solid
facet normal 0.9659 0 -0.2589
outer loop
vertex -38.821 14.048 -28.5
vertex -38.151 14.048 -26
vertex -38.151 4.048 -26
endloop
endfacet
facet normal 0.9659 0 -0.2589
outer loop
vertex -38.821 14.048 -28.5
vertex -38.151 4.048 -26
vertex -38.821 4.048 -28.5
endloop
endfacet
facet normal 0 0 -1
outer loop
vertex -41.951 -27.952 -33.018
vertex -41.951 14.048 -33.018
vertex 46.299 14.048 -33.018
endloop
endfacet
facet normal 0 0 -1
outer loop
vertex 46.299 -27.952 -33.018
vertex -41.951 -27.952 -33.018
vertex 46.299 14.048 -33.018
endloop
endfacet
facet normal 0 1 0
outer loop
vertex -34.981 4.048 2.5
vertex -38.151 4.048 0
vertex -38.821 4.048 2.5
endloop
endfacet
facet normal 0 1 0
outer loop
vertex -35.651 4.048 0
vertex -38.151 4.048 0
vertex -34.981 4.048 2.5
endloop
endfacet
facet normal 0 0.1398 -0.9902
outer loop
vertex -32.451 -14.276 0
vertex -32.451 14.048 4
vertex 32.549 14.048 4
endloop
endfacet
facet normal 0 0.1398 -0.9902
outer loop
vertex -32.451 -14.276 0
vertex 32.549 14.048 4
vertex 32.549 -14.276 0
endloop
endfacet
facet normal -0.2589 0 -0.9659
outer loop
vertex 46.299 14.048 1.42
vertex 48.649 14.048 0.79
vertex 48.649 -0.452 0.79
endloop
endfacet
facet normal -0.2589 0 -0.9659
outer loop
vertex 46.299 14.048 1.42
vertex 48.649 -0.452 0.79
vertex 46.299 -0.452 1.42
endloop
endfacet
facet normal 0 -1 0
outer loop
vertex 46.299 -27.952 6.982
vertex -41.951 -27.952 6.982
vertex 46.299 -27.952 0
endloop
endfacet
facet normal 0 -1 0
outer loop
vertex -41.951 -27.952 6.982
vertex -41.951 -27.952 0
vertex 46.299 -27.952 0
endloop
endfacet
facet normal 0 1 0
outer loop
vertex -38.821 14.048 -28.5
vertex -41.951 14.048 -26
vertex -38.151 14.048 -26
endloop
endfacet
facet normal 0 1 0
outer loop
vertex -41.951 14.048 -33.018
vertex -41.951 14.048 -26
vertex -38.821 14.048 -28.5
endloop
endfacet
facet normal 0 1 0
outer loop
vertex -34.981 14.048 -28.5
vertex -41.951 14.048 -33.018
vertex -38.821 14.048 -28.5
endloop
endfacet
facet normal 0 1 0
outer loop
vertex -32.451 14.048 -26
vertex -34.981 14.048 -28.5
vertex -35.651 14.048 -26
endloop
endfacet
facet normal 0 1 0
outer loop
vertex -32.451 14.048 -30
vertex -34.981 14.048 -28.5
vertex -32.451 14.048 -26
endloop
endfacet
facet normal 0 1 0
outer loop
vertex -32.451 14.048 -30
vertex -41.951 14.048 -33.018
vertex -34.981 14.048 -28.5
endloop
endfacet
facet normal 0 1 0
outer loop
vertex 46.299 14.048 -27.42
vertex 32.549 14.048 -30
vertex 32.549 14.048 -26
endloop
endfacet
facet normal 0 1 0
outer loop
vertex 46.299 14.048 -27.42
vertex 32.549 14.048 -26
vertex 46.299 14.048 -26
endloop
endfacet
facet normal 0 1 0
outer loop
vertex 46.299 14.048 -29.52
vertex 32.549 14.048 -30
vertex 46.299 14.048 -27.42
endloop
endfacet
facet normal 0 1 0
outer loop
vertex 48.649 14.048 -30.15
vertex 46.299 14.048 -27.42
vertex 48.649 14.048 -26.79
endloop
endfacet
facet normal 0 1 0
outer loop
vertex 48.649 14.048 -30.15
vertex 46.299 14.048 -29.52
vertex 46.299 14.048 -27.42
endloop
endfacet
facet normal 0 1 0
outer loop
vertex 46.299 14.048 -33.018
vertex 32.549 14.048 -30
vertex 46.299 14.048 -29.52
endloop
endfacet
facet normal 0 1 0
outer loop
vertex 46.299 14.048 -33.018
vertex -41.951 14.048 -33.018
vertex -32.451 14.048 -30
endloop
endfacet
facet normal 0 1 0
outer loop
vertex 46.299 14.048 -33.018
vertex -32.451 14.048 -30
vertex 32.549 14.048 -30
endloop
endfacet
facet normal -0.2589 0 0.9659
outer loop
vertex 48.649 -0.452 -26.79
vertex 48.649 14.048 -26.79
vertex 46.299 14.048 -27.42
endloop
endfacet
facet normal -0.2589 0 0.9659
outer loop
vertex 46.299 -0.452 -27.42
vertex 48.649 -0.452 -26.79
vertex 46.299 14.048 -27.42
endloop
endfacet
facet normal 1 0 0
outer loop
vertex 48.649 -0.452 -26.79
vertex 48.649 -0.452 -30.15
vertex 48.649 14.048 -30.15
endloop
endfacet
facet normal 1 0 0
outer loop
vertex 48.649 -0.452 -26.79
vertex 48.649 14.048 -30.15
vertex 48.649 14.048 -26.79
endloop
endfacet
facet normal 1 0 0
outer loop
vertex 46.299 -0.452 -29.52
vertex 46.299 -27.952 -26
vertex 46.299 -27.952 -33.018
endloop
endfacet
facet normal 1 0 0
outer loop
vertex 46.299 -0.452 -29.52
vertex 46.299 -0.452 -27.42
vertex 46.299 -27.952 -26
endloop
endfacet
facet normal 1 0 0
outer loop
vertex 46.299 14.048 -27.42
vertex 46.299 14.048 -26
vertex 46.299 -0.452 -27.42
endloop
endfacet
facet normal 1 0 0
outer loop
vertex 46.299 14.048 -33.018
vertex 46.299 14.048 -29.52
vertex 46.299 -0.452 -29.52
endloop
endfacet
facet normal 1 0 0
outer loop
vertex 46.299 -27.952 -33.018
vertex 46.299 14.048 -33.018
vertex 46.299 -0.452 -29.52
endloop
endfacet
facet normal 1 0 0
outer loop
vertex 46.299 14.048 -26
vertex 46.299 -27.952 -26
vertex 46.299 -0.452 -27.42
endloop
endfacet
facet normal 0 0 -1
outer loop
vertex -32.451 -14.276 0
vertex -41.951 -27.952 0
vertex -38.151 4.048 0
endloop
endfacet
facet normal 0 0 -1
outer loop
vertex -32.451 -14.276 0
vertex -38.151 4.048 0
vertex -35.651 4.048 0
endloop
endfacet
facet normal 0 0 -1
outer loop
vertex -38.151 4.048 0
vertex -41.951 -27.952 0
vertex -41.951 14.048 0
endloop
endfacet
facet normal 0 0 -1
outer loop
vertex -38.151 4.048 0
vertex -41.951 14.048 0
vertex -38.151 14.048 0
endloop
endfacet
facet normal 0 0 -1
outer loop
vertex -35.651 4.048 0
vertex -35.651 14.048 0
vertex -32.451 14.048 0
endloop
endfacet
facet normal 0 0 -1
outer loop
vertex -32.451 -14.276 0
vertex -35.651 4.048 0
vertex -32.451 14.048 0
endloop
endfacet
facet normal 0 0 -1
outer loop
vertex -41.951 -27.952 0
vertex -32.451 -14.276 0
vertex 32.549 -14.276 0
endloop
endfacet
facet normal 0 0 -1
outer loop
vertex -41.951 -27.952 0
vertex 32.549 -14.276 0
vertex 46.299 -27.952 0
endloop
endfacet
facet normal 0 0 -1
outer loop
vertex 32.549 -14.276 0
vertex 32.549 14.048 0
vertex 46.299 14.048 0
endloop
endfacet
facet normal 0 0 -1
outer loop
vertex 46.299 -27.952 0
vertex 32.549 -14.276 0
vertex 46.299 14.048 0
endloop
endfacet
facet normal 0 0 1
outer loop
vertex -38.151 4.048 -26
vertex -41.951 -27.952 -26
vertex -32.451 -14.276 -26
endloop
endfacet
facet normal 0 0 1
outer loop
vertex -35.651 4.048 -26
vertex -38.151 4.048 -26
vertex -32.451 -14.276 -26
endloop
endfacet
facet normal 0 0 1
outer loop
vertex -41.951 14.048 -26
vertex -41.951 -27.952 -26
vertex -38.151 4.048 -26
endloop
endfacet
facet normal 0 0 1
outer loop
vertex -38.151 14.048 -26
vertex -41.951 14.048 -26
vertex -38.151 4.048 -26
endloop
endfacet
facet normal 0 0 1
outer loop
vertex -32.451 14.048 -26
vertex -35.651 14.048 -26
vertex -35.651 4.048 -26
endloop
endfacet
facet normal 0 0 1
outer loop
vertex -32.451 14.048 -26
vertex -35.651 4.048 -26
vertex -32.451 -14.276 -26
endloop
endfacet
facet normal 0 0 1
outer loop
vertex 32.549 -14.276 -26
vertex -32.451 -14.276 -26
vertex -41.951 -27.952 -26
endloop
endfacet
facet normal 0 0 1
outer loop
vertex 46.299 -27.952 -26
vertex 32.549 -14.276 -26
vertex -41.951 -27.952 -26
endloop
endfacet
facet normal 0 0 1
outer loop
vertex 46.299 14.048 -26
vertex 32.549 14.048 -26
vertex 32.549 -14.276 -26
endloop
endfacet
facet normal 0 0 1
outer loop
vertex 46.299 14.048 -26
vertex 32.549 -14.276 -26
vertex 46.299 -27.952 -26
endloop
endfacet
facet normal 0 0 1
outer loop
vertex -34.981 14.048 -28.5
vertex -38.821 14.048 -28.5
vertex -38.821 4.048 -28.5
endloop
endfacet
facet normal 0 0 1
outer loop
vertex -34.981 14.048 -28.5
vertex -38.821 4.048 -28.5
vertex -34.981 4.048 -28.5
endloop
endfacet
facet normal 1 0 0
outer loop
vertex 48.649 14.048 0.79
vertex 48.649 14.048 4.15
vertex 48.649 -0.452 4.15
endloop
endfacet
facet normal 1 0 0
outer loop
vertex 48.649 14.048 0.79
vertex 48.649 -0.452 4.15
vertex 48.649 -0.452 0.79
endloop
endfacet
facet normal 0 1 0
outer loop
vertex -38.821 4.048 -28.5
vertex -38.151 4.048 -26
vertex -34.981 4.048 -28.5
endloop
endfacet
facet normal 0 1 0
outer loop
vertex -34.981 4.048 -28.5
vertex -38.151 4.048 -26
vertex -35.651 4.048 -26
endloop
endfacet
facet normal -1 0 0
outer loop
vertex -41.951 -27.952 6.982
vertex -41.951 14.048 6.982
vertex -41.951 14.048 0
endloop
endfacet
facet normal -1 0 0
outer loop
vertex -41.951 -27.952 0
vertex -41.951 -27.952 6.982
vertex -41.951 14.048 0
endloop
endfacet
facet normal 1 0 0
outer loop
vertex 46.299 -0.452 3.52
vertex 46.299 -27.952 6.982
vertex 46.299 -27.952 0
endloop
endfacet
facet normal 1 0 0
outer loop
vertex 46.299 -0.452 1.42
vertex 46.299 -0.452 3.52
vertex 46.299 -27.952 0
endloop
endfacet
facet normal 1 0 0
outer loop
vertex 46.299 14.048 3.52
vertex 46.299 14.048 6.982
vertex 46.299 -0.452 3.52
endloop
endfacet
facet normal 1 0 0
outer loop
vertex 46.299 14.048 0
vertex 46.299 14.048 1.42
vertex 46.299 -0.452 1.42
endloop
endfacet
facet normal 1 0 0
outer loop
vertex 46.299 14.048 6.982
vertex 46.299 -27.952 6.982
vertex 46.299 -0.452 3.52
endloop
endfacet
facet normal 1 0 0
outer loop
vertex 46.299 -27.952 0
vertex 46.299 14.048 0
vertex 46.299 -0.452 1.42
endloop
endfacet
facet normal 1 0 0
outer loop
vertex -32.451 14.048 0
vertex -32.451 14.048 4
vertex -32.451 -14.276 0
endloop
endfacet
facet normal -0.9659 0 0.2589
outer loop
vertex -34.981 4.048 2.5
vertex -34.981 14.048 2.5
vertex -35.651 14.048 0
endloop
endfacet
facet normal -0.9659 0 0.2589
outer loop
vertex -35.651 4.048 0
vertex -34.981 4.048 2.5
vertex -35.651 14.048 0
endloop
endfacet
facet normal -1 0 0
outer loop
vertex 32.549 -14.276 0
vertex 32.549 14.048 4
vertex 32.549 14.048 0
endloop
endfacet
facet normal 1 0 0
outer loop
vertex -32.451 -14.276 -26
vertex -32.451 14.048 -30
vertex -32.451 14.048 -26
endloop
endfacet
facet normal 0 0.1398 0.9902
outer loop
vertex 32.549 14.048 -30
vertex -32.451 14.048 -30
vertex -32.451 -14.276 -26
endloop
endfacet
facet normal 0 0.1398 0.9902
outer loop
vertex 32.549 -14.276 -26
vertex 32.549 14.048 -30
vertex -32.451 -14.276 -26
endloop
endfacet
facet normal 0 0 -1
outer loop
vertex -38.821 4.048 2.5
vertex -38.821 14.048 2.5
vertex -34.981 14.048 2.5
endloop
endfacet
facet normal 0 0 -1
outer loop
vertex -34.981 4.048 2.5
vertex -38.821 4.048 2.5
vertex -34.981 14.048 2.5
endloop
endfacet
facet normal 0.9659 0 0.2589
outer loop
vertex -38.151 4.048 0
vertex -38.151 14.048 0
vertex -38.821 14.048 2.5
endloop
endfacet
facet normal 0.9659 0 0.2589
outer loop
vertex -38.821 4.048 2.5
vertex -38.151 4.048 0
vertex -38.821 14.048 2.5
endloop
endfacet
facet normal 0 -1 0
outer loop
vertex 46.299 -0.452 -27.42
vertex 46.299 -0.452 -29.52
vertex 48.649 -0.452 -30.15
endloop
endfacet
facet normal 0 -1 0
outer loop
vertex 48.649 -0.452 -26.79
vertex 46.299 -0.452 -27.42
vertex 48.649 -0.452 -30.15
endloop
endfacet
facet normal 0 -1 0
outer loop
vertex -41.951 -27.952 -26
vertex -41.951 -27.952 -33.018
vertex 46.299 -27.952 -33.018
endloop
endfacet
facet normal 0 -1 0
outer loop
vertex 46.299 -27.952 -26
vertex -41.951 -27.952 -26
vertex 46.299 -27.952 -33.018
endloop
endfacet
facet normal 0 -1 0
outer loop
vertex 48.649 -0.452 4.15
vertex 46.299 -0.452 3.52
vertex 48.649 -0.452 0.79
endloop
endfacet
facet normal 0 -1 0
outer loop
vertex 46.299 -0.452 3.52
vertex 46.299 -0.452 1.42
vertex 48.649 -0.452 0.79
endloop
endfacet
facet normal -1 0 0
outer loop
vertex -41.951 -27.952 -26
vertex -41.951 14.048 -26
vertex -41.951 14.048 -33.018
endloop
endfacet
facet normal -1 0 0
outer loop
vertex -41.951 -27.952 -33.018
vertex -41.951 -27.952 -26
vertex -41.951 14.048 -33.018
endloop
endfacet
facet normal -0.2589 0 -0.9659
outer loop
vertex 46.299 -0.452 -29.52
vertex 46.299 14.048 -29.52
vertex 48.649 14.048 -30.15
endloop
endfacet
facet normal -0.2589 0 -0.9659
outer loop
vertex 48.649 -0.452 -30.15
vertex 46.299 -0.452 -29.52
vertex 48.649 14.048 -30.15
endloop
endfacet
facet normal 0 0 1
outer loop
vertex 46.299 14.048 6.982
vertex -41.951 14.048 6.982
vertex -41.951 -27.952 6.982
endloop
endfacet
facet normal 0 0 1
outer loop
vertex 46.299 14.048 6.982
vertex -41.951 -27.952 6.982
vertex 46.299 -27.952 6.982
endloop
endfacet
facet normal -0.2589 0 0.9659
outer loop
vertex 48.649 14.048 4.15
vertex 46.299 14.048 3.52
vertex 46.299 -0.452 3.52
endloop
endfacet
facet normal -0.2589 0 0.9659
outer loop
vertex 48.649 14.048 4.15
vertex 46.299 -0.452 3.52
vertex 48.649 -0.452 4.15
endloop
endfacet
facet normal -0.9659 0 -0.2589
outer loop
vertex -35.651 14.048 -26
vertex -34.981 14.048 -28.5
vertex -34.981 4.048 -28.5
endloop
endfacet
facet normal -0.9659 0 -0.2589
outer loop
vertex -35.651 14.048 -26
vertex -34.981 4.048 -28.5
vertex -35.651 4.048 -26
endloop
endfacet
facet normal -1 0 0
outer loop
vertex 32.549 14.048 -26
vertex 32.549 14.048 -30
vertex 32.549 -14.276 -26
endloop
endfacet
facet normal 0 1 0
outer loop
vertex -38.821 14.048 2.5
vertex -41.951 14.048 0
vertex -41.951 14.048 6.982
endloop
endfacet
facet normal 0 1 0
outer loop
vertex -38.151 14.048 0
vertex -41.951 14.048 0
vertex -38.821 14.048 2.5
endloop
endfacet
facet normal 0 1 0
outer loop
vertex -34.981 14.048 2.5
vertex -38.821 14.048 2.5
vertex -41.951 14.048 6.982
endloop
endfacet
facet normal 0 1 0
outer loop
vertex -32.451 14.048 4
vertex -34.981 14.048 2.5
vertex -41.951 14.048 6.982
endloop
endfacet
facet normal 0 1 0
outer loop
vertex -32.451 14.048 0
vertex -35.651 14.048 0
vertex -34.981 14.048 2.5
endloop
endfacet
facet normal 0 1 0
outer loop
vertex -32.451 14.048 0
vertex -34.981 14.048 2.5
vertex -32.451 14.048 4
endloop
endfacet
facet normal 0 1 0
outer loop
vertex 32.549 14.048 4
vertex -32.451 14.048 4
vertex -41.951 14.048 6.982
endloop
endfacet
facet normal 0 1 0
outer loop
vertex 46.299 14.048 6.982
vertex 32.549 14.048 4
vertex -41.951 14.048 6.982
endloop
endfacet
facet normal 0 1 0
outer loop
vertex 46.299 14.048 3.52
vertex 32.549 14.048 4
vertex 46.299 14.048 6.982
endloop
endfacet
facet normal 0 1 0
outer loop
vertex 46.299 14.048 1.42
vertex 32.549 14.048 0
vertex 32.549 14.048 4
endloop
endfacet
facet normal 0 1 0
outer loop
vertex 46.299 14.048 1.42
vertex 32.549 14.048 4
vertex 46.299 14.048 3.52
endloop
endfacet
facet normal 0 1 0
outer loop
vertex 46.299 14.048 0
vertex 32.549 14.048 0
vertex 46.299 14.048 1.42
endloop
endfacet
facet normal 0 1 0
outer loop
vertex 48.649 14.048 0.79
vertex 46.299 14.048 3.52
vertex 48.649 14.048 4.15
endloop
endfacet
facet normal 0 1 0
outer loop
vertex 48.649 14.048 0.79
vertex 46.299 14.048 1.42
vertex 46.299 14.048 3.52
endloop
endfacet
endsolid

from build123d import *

# Parameters (mm, degrees)
SKETCH1_W               = 88.25
SKETCH1_H               = 42
BOSS_EXTRUDE1_DEPTH     = 5
CUT_EXTRUDE1_DEPTH      = 1
CUT_EXTRUDE1_DEPTH_BACK = 10
BOSS_EXTRUDE2_DEPTH     = 14.5
CUT_EXTRUDE2_DEPTH      = 65
SKETCH7_W               = 88.25
SKETCH7_H               = 1.9825
SKETCH7_H_2             = 2.0175
BOSS_EXTRUDE3_DEPTH     = 42


with BuildPart() as part:
    # Sketch1 → Boss-Extrude1 (new body)
    with BuildSketch(Plane.XY):
        with Locations((2.173974505, -6.951707737)):
            Rectangle(SKETCH1_W, SKETCH1_H)
    extrude(amount=BOSS_EXTRUDE1_DEPTH)

    # Sketch2 → Cut-Extrude1 (cut, two sides)
    with BuildSketch(Plane(origin=(0, 14.048292263, 0), x_dir=(1, 0, 0), z_dir=(0, 1, 0))) as cut_extrude1_sk:
        Polygon((-35.651025495, 0), (-38.151025495, 0), (-38.820898476, -2.5), (-34.981152514, -2.5), align=None)
    extrude(amount=CUT_EXTRUDE1_DEPTH, mode=Mode.SUBTRACT)
    extrude(cut_extrude1_sk.sketch, amount=-CUT_EXTRUDE1_DEPTH_BACK, mode=Mode.SUBTRACT)

    # Sketch3 → Boss-Extrude2 (add)
    with BuildSketch(Plane(origin=(0, 14.048292263, 0), x_dir=(1, 0, 0), z_dir=(0, 1, 0))):
        Polygon((46.298974505, -3.52), (48.648974505, -4.149680602), (48.648974505, -0.790319398), (46.298974505, -1.42), align=None)
    extrude(amount=-BOSS_EXTRUDE2_DEPTH)

    # Sketch6 → Cut-Extrude2 (cut)
    with BuildSketch(Plane.ZY.offset(32.451025495)):
        Polygon((-0.05, -14.629560467), (0, 14.048292263), (4, 14.048292263), align=None)
    extrude(amount=-CUT_EXTRUDE2_DEPTH, mode=Mode.SUBTRACT)


with BuildPart() as body_2:
    # Mirror3: mirrored copy
    add(part.part.mirror(Plane(origin=(0, 0, -13), x_dir=(1, 0, 0), z_dir=(0, 0, -1))))


with BuildPart() as part_1:
    add(part.part)

    add(body_2.part)  # Boss-Extrude3 merges body 2
    # Sketch7 → Boss-Extrude3 (add)
    with BuildSketch(Plane(origin=(0, 14.048292263, 0), x_dir=(1, 0, 0), z_dir=(0, 1, 0))):
        with Locations((2.173974505, -5.99125)):
            Rectangle(SKETCH7_W, SKETCH7_H)
        with Locations((2.173974505, 32.00875)):
            Rectangle(SKETCH7_W, SKETCH7_H_2)
    extrude(amount=-BOSS_EXTRUDE3_DEPTH)


solid = part_1.part
